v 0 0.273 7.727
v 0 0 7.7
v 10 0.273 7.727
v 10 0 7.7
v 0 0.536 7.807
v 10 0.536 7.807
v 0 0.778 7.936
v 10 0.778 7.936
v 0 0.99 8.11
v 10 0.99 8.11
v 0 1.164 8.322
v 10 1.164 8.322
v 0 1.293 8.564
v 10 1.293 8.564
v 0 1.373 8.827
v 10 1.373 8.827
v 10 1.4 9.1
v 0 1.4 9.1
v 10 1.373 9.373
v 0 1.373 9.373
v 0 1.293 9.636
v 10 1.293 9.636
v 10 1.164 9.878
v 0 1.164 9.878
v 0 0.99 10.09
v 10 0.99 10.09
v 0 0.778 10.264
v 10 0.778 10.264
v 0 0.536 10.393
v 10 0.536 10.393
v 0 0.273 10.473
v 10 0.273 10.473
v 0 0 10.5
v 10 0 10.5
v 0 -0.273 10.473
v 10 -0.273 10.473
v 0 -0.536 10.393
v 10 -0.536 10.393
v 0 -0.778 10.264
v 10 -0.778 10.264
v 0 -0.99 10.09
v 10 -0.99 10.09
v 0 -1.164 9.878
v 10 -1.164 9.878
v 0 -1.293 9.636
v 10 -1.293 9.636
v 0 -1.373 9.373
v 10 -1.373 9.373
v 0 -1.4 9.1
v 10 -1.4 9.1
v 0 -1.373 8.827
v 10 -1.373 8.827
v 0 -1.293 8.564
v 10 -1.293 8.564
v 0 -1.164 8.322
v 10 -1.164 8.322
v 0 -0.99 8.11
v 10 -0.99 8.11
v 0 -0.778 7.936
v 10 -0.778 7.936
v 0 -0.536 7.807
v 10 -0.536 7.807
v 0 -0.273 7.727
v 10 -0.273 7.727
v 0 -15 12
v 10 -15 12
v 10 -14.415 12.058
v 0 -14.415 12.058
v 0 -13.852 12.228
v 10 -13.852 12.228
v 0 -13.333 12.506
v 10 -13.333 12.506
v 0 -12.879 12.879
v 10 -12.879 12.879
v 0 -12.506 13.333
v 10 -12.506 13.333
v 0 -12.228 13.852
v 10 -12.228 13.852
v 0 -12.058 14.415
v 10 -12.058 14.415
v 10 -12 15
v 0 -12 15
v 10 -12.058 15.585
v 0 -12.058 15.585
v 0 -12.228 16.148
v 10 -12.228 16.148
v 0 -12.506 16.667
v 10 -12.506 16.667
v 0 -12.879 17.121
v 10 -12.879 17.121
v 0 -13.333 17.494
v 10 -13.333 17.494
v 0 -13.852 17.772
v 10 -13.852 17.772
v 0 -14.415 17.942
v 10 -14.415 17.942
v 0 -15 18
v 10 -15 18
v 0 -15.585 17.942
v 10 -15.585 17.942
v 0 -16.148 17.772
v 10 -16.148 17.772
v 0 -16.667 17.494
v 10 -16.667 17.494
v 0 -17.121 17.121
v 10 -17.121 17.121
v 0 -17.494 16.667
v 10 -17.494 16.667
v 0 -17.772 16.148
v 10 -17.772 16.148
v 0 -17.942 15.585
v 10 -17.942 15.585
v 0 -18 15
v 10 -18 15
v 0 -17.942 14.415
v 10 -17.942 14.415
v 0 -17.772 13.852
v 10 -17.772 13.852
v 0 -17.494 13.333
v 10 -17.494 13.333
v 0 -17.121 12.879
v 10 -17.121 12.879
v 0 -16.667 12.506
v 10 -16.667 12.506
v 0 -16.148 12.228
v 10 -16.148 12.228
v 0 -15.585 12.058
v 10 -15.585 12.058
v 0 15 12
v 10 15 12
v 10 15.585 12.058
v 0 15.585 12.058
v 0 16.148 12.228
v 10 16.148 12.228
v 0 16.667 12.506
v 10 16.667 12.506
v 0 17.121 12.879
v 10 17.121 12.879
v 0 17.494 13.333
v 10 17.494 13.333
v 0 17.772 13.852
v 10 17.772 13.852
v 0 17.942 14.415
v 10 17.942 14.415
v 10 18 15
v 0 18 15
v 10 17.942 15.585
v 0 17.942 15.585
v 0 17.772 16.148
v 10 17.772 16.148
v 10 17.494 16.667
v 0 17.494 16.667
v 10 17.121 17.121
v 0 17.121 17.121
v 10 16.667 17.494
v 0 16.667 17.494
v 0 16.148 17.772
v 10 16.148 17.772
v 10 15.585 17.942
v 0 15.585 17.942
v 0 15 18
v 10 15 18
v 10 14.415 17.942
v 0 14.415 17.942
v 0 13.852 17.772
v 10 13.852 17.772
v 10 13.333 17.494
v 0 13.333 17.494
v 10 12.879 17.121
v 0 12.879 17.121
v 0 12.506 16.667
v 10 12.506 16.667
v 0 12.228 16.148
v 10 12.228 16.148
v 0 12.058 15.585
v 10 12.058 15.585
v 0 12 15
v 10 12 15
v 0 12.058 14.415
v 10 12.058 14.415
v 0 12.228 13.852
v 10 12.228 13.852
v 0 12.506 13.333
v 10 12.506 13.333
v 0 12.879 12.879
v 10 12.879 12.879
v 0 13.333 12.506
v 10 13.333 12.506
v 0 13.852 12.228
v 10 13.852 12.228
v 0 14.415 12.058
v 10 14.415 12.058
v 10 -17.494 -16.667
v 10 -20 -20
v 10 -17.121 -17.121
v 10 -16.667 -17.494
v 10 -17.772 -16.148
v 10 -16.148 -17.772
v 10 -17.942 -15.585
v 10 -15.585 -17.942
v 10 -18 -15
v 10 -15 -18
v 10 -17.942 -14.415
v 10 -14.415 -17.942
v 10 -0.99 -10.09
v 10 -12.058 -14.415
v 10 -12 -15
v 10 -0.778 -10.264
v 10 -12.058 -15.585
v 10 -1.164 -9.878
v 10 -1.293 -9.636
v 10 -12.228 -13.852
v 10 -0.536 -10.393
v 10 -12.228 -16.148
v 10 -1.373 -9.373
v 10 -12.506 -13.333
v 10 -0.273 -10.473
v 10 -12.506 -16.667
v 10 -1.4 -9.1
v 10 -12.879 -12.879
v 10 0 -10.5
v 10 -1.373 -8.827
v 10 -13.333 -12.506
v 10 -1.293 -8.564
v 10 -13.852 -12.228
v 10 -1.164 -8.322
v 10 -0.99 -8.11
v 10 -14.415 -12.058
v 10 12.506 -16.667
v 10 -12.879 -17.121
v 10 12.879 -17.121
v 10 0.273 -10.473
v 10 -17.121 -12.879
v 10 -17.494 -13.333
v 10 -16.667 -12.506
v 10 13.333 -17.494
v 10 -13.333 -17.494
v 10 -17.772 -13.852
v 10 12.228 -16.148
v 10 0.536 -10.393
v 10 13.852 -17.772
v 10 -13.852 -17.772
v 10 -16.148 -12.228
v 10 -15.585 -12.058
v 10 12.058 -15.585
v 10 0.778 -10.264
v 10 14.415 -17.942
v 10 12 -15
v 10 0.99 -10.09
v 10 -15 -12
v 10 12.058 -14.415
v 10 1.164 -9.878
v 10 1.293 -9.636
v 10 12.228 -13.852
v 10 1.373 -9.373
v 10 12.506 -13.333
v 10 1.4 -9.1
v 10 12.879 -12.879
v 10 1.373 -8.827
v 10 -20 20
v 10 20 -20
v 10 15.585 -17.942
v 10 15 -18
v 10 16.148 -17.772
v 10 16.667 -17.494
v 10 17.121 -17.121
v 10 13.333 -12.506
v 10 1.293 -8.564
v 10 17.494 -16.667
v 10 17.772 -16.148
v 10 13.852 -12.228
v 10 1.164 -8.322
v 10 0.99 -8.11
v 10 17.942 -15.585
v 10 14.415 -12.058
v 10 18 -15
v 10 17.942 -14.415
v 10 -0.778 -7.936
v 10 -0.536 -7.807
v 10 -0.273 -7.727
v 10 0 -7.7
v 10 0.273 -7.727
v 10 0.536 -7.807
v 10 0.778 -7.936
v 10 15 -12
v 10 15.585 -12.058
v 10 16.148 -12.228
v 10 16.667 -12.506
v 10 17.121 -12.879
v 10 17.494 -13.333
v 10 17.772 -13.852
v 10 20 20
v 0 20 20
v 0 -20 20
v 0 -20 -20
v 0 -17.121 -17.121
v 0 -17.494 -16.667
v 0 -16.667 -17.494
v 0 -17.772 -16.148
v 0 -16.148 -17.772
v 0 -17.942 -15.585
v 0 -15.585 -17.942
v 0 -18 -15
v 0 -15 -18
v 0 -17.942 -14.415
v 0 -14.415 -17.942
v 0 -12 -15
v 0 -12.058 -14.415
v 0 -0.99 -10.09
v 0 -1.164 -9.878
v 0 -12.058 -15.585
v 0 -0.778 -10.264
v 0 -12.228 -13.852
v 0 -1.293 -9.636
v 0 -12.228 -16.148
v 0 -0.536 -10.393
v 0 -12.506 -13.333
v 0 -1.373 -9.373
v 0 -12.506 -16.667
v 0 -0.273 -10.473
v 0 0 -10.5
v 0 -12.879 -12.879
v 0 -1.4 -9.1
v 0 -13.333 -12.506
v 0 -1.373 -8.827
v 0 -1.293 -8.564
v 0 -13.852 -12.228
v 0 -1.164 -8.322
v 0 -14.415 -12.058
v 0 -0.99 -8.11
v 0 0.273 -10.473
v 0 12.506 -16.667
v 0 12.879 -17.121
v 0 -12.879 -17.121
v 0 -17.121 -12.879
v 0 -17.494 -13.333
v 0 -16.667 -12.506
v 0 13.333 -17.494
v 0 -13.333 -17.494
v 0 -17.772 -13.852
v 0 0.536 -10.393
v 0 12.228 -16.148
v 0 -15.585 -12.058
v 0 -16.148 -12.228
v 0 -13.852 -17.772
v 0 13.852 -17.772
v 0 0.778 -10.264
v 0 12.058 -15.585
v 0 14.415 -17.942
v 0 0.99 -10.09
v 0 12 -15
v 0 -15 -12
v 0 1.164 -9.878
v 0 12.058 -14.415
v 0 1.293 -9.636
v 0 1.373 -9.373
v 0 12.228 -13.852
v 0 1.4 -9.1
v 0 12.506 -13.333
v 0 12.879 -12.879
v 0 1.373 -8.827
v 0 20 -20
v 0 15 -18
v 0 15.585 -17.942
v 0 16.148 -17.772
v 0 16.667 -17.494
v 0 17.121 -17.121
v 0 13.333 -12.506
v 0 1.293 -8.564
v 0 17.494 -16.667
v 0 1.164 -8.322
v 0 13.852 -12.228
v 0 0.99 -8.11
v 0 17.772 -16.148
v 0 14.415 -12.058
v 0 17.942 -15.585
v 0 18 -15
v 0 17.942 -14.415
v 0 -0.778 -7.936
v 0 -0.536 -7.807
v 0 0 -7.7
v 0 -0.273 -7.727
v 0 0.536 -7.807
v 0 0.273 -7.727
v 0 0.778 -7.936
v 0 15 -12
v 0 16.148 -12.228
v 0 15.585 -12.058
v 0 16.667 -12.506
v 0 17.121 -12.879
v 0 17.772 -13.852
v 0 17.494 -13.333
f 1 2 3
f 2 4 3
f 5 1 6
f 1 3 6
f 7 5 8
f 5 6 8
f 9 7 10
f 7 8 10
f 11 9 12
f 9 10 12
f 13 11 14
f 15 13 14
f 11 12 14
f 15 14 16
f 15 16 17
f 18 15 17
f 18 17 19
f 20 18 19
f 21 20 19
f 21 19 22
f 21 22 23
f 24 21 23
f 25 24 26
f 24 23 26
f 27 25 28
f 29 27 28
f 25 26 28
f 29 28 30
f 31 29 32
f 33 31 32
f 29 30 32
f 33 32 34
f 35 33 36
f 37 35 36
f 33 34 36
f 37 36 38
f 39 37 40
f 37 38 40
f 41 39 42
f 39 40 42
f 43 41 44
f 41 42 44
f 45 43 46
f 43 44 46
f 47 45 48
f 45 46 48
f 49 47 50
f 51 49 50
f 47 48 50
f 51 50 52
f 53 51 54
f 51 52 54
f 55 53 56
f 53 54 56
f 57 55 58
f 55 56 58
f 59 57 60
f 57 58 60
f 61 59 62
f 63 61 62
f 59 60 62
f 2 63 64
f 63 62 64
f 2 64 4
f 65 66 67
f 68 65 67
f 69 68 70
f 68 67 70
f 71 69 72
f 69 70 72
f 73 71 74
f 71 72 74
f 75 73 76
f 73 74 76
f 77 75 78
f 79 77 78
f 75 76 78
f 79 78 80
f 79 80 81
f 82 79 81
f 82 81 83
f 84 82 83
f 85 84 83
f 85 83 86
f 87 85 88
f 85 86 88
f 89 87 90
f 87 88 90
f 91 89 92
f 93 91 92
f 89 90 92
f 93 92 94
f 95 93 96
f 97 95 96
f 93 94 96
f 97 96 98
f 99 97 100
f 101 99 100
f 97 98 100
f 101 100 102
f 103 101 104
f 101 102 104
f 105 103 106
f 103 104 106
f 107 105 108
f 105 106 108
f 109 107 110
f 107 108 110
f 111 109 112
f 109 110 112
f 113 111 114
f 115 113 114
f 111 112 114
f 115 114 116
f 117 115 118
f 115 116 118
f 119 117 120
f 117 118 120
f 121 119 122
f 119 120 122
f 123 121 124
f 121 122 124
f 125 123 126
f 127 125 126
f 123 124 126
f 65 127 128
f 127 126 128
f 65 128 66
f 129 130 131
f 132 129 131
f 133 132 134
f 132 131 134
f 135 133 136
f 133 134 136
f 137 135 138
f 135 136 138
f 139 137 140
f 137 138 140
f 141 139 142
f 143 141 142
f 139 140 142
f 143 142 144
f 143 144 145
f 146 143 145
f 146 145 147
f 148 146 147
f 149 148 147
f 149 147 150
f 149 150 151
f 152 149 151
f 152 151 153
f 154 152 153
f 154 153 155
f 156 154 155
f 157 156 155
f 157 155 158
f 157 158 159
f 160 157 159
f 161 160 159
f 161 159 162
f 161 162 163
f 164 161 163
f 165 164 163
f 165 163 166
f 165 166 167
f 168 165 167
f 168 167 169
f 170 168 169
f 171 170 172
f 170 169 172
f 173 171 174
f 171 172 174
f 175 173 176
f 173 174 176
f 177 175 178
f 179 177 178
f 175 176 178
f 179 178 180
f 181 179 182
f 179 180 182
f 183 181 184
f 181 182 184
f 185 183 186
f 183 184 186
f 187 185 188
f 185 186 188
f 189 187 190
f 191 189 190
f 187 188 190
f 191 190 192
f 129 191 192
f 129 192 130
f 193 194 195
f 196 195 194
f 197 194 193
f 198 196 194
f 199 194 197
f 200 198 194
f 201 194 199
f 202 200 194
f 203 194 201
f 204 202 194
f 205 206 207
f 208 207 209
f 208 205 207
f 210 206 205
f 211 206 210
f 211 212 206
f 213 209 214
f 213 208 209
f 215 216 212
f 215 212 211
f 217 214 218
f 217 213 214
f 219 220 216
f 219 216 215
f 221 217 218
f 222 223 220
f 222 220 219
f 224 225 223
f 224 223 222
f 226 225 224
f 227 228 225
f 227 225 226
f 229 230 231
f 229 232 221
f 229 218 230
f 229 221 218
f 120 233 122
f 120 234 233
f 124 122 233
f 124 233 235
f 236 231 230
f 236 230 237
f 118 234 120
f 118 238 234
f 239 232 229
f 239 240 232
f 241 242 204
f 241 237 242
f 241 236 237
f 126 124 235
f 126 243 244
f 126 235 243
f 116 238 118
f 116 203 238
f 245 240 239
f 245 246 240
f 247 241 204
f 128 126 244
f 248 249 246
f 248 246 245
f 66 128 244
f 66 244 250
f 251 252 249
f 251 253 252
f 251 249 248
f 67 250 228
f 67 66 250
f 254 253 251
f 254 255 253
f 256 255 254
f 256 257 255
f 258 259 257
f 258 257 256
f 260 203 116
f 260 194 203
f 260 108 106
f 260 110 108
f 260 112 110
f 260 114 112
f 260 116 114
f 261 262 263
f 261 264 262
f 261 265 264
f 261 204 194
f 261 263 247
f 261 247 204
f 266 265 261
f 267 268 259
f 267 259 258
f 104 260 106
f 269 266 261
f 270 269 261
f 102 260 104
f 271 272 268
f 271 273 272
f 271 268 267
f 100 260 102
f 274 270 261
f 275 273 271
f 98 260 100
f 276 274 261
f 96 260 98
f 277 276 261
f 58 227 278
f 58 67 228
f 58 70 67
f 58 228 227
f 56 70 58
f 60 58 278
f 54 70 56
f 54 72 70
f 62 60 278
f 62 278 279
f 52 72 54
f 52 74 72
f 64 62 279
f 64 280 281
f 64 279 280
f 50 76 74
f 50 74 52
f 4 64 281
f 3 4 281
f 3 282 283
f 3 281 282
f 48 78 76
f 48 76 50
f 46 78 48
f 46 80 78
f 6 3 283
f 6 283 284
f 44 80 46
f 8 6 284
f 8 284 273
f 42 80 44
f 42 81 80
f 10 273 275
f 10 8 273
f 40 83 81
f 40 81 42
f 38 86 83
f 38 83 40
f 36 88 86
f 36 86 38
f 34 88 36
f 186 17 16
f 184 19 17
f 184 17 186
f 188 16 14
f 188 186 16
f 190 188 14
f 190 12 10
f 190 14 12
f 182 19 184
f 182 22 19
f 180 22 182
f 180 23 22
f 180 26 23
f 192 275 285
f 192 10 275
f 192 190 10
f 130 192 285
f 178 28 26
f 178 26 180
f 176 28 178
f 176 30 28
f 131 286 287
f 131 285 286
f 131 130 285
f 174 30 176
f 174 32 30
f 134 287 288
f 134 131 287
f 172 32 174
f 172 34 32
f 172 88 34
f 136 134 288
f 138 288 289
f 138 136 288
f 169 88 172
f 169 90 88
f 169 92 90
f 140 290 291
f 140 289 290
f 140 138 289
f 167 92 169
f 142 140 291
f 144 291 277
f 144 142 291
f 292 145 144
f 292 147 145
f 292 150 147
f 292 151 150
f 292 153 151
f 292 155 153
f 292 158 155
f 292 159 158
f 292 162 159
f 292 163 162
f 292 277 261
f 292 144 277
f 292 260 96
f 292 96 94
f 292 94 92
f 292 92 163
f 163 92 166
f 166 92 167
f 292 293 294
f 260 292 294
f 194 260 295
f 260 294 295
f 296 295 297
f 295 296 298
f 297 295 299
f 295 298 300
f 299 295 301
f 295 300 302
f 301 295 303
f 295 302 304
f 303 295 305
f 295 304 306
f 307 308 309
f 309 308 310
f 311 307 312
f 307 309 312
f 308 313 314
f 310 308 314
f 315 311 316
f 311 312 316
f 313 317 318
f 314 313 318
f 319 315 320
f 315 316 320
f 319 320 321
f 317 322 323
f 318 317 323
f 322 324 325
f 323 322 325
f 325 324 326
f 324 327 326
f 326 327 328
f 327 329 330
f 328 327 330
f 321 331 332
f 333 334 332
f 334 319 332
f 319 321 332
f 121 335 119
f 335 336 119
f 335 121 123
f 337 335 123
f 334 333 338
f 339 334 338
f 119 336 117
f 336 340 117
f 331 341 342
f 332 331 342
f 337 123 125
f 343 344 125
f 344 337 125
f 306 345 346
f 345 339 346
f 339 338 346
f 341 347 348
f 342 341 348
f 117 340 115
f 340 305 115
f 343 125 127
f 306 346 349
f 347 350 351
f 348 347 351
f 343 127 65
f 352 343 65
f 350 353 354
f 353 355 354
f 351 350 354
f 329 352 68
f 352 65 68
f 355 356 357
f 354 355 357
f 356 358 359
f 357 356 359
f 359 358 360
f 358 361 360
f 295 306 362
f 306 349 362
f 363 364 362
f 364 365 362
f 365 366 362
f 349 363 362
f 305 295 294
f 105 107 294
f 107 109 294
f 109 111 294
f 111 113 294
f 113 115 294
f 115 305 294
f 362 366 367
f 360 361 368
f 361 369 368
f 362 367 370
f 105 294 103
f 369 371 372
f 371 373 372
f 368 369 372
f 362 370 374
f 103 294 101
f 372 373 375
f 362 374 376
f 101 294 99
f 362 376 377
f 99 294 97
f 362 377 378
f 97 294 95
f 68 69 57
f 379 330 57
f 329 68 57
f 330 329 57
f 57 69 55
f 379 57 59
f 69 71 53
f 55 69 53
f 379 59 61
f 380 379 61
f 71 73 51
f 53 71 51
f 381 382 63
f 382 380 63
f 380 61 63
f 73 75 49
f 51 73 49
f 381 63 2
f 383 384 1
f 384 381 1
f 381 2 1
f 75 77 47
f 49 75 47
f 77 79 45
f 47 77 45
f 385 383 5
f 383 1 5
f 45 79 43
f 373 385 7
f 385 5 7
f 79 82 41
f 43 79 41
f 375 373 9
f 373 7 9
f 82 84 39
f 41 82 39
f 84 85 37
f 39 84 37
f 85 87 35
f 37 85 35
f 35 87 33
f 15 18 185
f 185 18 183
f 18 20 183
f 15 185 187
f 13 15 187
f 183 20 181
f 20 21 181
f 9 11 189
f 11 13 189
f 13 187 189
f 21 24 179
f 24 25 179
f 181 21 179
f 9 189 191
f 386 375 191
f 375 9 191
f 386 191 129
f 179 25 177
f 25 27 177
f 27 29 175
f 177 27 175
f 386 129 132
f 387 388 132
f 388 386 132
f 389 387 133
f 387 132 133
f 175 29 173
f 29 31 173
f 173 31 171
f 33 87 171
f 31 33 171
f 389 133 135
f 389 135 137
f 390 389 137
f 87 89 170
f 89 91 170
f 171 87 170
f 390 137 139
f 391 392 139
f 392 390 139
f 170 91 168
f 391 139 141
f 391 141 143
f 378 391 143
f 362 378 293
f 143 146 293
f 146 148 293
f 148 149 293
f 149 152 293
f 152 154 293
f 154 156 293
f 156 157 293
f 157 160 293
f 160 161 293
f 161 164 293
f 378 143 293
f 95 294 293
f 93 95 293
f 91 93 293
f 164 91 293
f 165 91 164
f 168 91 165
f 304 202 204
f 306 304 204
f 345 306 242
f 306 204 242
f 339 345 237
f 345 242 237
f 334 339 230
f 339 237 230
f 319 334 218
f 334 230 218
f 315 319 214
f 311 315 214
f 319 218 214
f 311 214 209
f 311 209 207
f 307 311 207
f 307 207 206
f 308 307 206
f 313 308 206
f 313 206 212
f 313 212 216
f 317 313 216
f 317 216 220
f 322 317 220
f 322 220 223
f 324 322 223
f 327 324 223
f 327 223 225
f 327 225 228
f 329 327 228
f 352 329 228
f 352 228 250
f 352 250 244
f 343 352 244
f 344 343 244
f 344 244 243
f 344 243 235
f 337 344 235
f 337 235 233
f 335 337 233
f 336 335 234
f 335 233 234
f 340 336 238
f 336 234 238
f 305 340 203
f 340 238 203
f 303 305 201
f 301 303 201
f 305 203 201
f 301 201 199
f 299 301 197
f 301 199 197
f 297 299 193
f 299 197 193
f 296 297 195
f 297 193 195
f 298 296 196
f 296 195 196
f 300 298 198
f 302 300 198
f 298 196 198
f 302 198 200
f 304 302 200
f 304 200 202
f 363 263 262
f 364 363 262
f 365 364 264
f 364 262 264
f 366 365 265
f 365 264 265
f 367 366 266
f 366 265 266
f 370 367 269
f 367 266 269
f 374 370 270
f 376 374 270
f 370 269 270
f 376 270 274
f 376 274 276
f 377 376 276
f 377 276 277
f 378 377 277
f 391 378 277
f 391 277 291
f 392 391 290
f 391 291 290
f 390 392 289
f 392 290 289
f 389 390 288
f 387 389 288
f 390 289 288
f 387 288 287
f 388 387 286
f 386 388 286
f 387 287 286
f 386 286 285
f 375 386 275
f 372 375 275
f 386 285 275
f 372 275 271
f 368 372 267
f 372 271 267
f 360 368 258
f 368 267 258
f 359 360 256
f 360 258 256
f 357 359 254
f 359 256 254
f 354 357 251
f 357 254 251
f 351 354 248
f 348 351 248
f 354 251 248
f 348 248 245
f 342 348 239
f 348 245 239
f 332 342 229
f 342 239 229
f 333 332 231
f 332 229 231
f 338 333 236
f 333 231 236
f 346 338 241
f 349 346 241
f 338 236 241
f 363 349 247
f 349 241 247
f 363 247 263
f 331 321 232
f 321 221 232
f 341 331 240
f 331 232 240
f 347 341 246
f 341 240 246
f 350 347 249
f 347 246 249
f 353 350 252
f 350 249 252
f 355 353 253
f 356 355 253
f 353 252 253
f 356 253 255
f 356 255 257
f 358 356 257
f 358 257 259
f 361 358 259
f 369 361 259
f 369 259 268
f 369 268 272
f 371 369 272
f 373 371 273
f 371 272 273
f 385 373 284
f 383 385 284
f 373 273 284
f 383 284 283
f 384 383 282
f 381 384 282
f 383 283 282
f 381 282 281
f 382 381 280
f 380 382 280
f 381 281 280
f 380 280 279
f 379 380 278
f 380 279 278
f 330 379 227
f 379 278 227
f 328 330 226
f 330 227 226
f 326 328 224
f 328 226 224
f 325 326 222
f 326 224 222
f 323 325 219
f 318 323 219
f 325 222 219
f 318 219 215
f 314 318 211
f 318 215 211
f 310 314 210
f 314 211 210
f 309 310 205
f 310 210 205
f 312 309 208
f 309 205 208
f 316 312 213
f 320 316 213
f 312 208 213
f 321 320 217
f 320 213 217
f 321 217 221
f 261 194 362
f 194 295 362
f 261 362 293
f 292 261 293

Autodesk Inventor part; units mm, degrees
ref_plane "YZ Plane" through (0, 0, 0) normal (1, 0, 0) x (0, 1, 0)
ref_plane "XZ Plane" through (0, 0, 0) normal (0, 1, 0) x (-1, 0, 0)
ref_plane "XY Plane" through (0, 0, 0) normal (0, 0, 1) x (1, 0, 0)
sketch "Skizze1" plane through (0, 0, 0) normal (1, 0, 0) x (0, 1, 0)
  line L0 (20, 20) -> (-20, 20)
  line L1 (-20, 20) -> (-20, -20)
  line L2 (-20, -20) -> (20, -20)
  line L3 (20, -20) -> (20, 20)
  point P0 (0, 0)
  dimension "d0" = 40
  dimension "d1" = 40
  dimension "d2" = 20
  dimension "d3" = 20
extrude "Extrusion1" add sketch "Skizze1" along normal blind 10
sketch "Skizze2" plane through (10, 0, 0) normal (1, 0, 0) x (0, 0, -1)
  circle A0 centre (-15, 15) radius 3
  circle A1 centre (-15, -15) radius 3
  circle A2 centre (15, -15) radius 3
  circle A3 centre (15, 15) radius 3
  point P0 (0, 0)
  point P1 (0, 0)
  dimension "d7" = 6
  dimension "d8" = 15
  dimension "d9" = 15
  dimension "d14" = 360
extrude "Extrusion2" cut sketch "Skizze2" against normal through all
sketch "Skizze3" plane through (10, 0, 0) normal (1, 0, 0) x (0, 0, -1)
  circle A0 centre (-9.1, 0) radius 1.4
  line L0 (0, 22.3983) -> (0, -21.9034) construction
  circle A1 centre (9.1, 0) radius 1.4
  point P0 (0, 0)
  dimension "d16" = 2.8
  dimension "d17" = 9.1
extrude "Extrusion3" cut sketch "Skizze3" against normal through all
properties part number "AdapterplatteGong_2025-03-27v00r00grm"
